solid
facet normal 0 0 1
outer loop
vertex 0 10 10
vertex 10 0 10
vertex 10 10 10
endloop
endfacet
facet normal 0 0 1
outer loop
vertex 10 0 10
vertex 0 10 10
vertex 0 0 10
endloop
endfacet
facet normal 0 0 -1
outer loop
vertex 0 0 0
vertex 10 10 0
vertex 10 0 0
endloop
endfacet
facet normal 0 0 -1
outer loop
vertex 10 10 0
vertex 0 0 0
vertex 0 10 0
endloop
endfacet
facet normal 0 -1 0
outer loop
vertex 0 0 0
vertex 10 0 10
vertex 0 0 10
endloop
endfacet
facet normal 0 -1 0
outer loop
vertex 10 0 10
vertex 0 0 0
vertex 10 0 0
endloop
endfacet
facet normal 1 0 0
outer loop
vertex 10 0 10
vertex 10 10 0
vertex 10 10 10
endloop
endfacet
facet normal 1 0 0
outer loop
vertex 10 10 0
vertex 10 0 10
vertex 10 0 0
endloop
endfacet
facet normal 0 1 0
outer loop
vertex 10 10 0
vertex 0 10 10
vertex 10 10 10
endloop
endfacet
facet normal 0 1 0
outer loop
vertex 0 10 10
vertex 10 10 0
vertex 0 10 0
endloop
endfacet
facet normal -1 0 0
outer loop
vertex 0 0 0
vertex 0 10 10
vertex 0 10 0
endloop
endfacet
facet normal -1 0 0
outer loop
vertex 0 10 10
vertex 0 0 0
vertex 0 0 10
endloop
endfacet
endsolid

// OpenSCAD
// Generated by scadwright. Do not hand-edit —
// edit the Python source and regenerate.

color("red") {
    cube([10, 10, 10], center=false);
}
